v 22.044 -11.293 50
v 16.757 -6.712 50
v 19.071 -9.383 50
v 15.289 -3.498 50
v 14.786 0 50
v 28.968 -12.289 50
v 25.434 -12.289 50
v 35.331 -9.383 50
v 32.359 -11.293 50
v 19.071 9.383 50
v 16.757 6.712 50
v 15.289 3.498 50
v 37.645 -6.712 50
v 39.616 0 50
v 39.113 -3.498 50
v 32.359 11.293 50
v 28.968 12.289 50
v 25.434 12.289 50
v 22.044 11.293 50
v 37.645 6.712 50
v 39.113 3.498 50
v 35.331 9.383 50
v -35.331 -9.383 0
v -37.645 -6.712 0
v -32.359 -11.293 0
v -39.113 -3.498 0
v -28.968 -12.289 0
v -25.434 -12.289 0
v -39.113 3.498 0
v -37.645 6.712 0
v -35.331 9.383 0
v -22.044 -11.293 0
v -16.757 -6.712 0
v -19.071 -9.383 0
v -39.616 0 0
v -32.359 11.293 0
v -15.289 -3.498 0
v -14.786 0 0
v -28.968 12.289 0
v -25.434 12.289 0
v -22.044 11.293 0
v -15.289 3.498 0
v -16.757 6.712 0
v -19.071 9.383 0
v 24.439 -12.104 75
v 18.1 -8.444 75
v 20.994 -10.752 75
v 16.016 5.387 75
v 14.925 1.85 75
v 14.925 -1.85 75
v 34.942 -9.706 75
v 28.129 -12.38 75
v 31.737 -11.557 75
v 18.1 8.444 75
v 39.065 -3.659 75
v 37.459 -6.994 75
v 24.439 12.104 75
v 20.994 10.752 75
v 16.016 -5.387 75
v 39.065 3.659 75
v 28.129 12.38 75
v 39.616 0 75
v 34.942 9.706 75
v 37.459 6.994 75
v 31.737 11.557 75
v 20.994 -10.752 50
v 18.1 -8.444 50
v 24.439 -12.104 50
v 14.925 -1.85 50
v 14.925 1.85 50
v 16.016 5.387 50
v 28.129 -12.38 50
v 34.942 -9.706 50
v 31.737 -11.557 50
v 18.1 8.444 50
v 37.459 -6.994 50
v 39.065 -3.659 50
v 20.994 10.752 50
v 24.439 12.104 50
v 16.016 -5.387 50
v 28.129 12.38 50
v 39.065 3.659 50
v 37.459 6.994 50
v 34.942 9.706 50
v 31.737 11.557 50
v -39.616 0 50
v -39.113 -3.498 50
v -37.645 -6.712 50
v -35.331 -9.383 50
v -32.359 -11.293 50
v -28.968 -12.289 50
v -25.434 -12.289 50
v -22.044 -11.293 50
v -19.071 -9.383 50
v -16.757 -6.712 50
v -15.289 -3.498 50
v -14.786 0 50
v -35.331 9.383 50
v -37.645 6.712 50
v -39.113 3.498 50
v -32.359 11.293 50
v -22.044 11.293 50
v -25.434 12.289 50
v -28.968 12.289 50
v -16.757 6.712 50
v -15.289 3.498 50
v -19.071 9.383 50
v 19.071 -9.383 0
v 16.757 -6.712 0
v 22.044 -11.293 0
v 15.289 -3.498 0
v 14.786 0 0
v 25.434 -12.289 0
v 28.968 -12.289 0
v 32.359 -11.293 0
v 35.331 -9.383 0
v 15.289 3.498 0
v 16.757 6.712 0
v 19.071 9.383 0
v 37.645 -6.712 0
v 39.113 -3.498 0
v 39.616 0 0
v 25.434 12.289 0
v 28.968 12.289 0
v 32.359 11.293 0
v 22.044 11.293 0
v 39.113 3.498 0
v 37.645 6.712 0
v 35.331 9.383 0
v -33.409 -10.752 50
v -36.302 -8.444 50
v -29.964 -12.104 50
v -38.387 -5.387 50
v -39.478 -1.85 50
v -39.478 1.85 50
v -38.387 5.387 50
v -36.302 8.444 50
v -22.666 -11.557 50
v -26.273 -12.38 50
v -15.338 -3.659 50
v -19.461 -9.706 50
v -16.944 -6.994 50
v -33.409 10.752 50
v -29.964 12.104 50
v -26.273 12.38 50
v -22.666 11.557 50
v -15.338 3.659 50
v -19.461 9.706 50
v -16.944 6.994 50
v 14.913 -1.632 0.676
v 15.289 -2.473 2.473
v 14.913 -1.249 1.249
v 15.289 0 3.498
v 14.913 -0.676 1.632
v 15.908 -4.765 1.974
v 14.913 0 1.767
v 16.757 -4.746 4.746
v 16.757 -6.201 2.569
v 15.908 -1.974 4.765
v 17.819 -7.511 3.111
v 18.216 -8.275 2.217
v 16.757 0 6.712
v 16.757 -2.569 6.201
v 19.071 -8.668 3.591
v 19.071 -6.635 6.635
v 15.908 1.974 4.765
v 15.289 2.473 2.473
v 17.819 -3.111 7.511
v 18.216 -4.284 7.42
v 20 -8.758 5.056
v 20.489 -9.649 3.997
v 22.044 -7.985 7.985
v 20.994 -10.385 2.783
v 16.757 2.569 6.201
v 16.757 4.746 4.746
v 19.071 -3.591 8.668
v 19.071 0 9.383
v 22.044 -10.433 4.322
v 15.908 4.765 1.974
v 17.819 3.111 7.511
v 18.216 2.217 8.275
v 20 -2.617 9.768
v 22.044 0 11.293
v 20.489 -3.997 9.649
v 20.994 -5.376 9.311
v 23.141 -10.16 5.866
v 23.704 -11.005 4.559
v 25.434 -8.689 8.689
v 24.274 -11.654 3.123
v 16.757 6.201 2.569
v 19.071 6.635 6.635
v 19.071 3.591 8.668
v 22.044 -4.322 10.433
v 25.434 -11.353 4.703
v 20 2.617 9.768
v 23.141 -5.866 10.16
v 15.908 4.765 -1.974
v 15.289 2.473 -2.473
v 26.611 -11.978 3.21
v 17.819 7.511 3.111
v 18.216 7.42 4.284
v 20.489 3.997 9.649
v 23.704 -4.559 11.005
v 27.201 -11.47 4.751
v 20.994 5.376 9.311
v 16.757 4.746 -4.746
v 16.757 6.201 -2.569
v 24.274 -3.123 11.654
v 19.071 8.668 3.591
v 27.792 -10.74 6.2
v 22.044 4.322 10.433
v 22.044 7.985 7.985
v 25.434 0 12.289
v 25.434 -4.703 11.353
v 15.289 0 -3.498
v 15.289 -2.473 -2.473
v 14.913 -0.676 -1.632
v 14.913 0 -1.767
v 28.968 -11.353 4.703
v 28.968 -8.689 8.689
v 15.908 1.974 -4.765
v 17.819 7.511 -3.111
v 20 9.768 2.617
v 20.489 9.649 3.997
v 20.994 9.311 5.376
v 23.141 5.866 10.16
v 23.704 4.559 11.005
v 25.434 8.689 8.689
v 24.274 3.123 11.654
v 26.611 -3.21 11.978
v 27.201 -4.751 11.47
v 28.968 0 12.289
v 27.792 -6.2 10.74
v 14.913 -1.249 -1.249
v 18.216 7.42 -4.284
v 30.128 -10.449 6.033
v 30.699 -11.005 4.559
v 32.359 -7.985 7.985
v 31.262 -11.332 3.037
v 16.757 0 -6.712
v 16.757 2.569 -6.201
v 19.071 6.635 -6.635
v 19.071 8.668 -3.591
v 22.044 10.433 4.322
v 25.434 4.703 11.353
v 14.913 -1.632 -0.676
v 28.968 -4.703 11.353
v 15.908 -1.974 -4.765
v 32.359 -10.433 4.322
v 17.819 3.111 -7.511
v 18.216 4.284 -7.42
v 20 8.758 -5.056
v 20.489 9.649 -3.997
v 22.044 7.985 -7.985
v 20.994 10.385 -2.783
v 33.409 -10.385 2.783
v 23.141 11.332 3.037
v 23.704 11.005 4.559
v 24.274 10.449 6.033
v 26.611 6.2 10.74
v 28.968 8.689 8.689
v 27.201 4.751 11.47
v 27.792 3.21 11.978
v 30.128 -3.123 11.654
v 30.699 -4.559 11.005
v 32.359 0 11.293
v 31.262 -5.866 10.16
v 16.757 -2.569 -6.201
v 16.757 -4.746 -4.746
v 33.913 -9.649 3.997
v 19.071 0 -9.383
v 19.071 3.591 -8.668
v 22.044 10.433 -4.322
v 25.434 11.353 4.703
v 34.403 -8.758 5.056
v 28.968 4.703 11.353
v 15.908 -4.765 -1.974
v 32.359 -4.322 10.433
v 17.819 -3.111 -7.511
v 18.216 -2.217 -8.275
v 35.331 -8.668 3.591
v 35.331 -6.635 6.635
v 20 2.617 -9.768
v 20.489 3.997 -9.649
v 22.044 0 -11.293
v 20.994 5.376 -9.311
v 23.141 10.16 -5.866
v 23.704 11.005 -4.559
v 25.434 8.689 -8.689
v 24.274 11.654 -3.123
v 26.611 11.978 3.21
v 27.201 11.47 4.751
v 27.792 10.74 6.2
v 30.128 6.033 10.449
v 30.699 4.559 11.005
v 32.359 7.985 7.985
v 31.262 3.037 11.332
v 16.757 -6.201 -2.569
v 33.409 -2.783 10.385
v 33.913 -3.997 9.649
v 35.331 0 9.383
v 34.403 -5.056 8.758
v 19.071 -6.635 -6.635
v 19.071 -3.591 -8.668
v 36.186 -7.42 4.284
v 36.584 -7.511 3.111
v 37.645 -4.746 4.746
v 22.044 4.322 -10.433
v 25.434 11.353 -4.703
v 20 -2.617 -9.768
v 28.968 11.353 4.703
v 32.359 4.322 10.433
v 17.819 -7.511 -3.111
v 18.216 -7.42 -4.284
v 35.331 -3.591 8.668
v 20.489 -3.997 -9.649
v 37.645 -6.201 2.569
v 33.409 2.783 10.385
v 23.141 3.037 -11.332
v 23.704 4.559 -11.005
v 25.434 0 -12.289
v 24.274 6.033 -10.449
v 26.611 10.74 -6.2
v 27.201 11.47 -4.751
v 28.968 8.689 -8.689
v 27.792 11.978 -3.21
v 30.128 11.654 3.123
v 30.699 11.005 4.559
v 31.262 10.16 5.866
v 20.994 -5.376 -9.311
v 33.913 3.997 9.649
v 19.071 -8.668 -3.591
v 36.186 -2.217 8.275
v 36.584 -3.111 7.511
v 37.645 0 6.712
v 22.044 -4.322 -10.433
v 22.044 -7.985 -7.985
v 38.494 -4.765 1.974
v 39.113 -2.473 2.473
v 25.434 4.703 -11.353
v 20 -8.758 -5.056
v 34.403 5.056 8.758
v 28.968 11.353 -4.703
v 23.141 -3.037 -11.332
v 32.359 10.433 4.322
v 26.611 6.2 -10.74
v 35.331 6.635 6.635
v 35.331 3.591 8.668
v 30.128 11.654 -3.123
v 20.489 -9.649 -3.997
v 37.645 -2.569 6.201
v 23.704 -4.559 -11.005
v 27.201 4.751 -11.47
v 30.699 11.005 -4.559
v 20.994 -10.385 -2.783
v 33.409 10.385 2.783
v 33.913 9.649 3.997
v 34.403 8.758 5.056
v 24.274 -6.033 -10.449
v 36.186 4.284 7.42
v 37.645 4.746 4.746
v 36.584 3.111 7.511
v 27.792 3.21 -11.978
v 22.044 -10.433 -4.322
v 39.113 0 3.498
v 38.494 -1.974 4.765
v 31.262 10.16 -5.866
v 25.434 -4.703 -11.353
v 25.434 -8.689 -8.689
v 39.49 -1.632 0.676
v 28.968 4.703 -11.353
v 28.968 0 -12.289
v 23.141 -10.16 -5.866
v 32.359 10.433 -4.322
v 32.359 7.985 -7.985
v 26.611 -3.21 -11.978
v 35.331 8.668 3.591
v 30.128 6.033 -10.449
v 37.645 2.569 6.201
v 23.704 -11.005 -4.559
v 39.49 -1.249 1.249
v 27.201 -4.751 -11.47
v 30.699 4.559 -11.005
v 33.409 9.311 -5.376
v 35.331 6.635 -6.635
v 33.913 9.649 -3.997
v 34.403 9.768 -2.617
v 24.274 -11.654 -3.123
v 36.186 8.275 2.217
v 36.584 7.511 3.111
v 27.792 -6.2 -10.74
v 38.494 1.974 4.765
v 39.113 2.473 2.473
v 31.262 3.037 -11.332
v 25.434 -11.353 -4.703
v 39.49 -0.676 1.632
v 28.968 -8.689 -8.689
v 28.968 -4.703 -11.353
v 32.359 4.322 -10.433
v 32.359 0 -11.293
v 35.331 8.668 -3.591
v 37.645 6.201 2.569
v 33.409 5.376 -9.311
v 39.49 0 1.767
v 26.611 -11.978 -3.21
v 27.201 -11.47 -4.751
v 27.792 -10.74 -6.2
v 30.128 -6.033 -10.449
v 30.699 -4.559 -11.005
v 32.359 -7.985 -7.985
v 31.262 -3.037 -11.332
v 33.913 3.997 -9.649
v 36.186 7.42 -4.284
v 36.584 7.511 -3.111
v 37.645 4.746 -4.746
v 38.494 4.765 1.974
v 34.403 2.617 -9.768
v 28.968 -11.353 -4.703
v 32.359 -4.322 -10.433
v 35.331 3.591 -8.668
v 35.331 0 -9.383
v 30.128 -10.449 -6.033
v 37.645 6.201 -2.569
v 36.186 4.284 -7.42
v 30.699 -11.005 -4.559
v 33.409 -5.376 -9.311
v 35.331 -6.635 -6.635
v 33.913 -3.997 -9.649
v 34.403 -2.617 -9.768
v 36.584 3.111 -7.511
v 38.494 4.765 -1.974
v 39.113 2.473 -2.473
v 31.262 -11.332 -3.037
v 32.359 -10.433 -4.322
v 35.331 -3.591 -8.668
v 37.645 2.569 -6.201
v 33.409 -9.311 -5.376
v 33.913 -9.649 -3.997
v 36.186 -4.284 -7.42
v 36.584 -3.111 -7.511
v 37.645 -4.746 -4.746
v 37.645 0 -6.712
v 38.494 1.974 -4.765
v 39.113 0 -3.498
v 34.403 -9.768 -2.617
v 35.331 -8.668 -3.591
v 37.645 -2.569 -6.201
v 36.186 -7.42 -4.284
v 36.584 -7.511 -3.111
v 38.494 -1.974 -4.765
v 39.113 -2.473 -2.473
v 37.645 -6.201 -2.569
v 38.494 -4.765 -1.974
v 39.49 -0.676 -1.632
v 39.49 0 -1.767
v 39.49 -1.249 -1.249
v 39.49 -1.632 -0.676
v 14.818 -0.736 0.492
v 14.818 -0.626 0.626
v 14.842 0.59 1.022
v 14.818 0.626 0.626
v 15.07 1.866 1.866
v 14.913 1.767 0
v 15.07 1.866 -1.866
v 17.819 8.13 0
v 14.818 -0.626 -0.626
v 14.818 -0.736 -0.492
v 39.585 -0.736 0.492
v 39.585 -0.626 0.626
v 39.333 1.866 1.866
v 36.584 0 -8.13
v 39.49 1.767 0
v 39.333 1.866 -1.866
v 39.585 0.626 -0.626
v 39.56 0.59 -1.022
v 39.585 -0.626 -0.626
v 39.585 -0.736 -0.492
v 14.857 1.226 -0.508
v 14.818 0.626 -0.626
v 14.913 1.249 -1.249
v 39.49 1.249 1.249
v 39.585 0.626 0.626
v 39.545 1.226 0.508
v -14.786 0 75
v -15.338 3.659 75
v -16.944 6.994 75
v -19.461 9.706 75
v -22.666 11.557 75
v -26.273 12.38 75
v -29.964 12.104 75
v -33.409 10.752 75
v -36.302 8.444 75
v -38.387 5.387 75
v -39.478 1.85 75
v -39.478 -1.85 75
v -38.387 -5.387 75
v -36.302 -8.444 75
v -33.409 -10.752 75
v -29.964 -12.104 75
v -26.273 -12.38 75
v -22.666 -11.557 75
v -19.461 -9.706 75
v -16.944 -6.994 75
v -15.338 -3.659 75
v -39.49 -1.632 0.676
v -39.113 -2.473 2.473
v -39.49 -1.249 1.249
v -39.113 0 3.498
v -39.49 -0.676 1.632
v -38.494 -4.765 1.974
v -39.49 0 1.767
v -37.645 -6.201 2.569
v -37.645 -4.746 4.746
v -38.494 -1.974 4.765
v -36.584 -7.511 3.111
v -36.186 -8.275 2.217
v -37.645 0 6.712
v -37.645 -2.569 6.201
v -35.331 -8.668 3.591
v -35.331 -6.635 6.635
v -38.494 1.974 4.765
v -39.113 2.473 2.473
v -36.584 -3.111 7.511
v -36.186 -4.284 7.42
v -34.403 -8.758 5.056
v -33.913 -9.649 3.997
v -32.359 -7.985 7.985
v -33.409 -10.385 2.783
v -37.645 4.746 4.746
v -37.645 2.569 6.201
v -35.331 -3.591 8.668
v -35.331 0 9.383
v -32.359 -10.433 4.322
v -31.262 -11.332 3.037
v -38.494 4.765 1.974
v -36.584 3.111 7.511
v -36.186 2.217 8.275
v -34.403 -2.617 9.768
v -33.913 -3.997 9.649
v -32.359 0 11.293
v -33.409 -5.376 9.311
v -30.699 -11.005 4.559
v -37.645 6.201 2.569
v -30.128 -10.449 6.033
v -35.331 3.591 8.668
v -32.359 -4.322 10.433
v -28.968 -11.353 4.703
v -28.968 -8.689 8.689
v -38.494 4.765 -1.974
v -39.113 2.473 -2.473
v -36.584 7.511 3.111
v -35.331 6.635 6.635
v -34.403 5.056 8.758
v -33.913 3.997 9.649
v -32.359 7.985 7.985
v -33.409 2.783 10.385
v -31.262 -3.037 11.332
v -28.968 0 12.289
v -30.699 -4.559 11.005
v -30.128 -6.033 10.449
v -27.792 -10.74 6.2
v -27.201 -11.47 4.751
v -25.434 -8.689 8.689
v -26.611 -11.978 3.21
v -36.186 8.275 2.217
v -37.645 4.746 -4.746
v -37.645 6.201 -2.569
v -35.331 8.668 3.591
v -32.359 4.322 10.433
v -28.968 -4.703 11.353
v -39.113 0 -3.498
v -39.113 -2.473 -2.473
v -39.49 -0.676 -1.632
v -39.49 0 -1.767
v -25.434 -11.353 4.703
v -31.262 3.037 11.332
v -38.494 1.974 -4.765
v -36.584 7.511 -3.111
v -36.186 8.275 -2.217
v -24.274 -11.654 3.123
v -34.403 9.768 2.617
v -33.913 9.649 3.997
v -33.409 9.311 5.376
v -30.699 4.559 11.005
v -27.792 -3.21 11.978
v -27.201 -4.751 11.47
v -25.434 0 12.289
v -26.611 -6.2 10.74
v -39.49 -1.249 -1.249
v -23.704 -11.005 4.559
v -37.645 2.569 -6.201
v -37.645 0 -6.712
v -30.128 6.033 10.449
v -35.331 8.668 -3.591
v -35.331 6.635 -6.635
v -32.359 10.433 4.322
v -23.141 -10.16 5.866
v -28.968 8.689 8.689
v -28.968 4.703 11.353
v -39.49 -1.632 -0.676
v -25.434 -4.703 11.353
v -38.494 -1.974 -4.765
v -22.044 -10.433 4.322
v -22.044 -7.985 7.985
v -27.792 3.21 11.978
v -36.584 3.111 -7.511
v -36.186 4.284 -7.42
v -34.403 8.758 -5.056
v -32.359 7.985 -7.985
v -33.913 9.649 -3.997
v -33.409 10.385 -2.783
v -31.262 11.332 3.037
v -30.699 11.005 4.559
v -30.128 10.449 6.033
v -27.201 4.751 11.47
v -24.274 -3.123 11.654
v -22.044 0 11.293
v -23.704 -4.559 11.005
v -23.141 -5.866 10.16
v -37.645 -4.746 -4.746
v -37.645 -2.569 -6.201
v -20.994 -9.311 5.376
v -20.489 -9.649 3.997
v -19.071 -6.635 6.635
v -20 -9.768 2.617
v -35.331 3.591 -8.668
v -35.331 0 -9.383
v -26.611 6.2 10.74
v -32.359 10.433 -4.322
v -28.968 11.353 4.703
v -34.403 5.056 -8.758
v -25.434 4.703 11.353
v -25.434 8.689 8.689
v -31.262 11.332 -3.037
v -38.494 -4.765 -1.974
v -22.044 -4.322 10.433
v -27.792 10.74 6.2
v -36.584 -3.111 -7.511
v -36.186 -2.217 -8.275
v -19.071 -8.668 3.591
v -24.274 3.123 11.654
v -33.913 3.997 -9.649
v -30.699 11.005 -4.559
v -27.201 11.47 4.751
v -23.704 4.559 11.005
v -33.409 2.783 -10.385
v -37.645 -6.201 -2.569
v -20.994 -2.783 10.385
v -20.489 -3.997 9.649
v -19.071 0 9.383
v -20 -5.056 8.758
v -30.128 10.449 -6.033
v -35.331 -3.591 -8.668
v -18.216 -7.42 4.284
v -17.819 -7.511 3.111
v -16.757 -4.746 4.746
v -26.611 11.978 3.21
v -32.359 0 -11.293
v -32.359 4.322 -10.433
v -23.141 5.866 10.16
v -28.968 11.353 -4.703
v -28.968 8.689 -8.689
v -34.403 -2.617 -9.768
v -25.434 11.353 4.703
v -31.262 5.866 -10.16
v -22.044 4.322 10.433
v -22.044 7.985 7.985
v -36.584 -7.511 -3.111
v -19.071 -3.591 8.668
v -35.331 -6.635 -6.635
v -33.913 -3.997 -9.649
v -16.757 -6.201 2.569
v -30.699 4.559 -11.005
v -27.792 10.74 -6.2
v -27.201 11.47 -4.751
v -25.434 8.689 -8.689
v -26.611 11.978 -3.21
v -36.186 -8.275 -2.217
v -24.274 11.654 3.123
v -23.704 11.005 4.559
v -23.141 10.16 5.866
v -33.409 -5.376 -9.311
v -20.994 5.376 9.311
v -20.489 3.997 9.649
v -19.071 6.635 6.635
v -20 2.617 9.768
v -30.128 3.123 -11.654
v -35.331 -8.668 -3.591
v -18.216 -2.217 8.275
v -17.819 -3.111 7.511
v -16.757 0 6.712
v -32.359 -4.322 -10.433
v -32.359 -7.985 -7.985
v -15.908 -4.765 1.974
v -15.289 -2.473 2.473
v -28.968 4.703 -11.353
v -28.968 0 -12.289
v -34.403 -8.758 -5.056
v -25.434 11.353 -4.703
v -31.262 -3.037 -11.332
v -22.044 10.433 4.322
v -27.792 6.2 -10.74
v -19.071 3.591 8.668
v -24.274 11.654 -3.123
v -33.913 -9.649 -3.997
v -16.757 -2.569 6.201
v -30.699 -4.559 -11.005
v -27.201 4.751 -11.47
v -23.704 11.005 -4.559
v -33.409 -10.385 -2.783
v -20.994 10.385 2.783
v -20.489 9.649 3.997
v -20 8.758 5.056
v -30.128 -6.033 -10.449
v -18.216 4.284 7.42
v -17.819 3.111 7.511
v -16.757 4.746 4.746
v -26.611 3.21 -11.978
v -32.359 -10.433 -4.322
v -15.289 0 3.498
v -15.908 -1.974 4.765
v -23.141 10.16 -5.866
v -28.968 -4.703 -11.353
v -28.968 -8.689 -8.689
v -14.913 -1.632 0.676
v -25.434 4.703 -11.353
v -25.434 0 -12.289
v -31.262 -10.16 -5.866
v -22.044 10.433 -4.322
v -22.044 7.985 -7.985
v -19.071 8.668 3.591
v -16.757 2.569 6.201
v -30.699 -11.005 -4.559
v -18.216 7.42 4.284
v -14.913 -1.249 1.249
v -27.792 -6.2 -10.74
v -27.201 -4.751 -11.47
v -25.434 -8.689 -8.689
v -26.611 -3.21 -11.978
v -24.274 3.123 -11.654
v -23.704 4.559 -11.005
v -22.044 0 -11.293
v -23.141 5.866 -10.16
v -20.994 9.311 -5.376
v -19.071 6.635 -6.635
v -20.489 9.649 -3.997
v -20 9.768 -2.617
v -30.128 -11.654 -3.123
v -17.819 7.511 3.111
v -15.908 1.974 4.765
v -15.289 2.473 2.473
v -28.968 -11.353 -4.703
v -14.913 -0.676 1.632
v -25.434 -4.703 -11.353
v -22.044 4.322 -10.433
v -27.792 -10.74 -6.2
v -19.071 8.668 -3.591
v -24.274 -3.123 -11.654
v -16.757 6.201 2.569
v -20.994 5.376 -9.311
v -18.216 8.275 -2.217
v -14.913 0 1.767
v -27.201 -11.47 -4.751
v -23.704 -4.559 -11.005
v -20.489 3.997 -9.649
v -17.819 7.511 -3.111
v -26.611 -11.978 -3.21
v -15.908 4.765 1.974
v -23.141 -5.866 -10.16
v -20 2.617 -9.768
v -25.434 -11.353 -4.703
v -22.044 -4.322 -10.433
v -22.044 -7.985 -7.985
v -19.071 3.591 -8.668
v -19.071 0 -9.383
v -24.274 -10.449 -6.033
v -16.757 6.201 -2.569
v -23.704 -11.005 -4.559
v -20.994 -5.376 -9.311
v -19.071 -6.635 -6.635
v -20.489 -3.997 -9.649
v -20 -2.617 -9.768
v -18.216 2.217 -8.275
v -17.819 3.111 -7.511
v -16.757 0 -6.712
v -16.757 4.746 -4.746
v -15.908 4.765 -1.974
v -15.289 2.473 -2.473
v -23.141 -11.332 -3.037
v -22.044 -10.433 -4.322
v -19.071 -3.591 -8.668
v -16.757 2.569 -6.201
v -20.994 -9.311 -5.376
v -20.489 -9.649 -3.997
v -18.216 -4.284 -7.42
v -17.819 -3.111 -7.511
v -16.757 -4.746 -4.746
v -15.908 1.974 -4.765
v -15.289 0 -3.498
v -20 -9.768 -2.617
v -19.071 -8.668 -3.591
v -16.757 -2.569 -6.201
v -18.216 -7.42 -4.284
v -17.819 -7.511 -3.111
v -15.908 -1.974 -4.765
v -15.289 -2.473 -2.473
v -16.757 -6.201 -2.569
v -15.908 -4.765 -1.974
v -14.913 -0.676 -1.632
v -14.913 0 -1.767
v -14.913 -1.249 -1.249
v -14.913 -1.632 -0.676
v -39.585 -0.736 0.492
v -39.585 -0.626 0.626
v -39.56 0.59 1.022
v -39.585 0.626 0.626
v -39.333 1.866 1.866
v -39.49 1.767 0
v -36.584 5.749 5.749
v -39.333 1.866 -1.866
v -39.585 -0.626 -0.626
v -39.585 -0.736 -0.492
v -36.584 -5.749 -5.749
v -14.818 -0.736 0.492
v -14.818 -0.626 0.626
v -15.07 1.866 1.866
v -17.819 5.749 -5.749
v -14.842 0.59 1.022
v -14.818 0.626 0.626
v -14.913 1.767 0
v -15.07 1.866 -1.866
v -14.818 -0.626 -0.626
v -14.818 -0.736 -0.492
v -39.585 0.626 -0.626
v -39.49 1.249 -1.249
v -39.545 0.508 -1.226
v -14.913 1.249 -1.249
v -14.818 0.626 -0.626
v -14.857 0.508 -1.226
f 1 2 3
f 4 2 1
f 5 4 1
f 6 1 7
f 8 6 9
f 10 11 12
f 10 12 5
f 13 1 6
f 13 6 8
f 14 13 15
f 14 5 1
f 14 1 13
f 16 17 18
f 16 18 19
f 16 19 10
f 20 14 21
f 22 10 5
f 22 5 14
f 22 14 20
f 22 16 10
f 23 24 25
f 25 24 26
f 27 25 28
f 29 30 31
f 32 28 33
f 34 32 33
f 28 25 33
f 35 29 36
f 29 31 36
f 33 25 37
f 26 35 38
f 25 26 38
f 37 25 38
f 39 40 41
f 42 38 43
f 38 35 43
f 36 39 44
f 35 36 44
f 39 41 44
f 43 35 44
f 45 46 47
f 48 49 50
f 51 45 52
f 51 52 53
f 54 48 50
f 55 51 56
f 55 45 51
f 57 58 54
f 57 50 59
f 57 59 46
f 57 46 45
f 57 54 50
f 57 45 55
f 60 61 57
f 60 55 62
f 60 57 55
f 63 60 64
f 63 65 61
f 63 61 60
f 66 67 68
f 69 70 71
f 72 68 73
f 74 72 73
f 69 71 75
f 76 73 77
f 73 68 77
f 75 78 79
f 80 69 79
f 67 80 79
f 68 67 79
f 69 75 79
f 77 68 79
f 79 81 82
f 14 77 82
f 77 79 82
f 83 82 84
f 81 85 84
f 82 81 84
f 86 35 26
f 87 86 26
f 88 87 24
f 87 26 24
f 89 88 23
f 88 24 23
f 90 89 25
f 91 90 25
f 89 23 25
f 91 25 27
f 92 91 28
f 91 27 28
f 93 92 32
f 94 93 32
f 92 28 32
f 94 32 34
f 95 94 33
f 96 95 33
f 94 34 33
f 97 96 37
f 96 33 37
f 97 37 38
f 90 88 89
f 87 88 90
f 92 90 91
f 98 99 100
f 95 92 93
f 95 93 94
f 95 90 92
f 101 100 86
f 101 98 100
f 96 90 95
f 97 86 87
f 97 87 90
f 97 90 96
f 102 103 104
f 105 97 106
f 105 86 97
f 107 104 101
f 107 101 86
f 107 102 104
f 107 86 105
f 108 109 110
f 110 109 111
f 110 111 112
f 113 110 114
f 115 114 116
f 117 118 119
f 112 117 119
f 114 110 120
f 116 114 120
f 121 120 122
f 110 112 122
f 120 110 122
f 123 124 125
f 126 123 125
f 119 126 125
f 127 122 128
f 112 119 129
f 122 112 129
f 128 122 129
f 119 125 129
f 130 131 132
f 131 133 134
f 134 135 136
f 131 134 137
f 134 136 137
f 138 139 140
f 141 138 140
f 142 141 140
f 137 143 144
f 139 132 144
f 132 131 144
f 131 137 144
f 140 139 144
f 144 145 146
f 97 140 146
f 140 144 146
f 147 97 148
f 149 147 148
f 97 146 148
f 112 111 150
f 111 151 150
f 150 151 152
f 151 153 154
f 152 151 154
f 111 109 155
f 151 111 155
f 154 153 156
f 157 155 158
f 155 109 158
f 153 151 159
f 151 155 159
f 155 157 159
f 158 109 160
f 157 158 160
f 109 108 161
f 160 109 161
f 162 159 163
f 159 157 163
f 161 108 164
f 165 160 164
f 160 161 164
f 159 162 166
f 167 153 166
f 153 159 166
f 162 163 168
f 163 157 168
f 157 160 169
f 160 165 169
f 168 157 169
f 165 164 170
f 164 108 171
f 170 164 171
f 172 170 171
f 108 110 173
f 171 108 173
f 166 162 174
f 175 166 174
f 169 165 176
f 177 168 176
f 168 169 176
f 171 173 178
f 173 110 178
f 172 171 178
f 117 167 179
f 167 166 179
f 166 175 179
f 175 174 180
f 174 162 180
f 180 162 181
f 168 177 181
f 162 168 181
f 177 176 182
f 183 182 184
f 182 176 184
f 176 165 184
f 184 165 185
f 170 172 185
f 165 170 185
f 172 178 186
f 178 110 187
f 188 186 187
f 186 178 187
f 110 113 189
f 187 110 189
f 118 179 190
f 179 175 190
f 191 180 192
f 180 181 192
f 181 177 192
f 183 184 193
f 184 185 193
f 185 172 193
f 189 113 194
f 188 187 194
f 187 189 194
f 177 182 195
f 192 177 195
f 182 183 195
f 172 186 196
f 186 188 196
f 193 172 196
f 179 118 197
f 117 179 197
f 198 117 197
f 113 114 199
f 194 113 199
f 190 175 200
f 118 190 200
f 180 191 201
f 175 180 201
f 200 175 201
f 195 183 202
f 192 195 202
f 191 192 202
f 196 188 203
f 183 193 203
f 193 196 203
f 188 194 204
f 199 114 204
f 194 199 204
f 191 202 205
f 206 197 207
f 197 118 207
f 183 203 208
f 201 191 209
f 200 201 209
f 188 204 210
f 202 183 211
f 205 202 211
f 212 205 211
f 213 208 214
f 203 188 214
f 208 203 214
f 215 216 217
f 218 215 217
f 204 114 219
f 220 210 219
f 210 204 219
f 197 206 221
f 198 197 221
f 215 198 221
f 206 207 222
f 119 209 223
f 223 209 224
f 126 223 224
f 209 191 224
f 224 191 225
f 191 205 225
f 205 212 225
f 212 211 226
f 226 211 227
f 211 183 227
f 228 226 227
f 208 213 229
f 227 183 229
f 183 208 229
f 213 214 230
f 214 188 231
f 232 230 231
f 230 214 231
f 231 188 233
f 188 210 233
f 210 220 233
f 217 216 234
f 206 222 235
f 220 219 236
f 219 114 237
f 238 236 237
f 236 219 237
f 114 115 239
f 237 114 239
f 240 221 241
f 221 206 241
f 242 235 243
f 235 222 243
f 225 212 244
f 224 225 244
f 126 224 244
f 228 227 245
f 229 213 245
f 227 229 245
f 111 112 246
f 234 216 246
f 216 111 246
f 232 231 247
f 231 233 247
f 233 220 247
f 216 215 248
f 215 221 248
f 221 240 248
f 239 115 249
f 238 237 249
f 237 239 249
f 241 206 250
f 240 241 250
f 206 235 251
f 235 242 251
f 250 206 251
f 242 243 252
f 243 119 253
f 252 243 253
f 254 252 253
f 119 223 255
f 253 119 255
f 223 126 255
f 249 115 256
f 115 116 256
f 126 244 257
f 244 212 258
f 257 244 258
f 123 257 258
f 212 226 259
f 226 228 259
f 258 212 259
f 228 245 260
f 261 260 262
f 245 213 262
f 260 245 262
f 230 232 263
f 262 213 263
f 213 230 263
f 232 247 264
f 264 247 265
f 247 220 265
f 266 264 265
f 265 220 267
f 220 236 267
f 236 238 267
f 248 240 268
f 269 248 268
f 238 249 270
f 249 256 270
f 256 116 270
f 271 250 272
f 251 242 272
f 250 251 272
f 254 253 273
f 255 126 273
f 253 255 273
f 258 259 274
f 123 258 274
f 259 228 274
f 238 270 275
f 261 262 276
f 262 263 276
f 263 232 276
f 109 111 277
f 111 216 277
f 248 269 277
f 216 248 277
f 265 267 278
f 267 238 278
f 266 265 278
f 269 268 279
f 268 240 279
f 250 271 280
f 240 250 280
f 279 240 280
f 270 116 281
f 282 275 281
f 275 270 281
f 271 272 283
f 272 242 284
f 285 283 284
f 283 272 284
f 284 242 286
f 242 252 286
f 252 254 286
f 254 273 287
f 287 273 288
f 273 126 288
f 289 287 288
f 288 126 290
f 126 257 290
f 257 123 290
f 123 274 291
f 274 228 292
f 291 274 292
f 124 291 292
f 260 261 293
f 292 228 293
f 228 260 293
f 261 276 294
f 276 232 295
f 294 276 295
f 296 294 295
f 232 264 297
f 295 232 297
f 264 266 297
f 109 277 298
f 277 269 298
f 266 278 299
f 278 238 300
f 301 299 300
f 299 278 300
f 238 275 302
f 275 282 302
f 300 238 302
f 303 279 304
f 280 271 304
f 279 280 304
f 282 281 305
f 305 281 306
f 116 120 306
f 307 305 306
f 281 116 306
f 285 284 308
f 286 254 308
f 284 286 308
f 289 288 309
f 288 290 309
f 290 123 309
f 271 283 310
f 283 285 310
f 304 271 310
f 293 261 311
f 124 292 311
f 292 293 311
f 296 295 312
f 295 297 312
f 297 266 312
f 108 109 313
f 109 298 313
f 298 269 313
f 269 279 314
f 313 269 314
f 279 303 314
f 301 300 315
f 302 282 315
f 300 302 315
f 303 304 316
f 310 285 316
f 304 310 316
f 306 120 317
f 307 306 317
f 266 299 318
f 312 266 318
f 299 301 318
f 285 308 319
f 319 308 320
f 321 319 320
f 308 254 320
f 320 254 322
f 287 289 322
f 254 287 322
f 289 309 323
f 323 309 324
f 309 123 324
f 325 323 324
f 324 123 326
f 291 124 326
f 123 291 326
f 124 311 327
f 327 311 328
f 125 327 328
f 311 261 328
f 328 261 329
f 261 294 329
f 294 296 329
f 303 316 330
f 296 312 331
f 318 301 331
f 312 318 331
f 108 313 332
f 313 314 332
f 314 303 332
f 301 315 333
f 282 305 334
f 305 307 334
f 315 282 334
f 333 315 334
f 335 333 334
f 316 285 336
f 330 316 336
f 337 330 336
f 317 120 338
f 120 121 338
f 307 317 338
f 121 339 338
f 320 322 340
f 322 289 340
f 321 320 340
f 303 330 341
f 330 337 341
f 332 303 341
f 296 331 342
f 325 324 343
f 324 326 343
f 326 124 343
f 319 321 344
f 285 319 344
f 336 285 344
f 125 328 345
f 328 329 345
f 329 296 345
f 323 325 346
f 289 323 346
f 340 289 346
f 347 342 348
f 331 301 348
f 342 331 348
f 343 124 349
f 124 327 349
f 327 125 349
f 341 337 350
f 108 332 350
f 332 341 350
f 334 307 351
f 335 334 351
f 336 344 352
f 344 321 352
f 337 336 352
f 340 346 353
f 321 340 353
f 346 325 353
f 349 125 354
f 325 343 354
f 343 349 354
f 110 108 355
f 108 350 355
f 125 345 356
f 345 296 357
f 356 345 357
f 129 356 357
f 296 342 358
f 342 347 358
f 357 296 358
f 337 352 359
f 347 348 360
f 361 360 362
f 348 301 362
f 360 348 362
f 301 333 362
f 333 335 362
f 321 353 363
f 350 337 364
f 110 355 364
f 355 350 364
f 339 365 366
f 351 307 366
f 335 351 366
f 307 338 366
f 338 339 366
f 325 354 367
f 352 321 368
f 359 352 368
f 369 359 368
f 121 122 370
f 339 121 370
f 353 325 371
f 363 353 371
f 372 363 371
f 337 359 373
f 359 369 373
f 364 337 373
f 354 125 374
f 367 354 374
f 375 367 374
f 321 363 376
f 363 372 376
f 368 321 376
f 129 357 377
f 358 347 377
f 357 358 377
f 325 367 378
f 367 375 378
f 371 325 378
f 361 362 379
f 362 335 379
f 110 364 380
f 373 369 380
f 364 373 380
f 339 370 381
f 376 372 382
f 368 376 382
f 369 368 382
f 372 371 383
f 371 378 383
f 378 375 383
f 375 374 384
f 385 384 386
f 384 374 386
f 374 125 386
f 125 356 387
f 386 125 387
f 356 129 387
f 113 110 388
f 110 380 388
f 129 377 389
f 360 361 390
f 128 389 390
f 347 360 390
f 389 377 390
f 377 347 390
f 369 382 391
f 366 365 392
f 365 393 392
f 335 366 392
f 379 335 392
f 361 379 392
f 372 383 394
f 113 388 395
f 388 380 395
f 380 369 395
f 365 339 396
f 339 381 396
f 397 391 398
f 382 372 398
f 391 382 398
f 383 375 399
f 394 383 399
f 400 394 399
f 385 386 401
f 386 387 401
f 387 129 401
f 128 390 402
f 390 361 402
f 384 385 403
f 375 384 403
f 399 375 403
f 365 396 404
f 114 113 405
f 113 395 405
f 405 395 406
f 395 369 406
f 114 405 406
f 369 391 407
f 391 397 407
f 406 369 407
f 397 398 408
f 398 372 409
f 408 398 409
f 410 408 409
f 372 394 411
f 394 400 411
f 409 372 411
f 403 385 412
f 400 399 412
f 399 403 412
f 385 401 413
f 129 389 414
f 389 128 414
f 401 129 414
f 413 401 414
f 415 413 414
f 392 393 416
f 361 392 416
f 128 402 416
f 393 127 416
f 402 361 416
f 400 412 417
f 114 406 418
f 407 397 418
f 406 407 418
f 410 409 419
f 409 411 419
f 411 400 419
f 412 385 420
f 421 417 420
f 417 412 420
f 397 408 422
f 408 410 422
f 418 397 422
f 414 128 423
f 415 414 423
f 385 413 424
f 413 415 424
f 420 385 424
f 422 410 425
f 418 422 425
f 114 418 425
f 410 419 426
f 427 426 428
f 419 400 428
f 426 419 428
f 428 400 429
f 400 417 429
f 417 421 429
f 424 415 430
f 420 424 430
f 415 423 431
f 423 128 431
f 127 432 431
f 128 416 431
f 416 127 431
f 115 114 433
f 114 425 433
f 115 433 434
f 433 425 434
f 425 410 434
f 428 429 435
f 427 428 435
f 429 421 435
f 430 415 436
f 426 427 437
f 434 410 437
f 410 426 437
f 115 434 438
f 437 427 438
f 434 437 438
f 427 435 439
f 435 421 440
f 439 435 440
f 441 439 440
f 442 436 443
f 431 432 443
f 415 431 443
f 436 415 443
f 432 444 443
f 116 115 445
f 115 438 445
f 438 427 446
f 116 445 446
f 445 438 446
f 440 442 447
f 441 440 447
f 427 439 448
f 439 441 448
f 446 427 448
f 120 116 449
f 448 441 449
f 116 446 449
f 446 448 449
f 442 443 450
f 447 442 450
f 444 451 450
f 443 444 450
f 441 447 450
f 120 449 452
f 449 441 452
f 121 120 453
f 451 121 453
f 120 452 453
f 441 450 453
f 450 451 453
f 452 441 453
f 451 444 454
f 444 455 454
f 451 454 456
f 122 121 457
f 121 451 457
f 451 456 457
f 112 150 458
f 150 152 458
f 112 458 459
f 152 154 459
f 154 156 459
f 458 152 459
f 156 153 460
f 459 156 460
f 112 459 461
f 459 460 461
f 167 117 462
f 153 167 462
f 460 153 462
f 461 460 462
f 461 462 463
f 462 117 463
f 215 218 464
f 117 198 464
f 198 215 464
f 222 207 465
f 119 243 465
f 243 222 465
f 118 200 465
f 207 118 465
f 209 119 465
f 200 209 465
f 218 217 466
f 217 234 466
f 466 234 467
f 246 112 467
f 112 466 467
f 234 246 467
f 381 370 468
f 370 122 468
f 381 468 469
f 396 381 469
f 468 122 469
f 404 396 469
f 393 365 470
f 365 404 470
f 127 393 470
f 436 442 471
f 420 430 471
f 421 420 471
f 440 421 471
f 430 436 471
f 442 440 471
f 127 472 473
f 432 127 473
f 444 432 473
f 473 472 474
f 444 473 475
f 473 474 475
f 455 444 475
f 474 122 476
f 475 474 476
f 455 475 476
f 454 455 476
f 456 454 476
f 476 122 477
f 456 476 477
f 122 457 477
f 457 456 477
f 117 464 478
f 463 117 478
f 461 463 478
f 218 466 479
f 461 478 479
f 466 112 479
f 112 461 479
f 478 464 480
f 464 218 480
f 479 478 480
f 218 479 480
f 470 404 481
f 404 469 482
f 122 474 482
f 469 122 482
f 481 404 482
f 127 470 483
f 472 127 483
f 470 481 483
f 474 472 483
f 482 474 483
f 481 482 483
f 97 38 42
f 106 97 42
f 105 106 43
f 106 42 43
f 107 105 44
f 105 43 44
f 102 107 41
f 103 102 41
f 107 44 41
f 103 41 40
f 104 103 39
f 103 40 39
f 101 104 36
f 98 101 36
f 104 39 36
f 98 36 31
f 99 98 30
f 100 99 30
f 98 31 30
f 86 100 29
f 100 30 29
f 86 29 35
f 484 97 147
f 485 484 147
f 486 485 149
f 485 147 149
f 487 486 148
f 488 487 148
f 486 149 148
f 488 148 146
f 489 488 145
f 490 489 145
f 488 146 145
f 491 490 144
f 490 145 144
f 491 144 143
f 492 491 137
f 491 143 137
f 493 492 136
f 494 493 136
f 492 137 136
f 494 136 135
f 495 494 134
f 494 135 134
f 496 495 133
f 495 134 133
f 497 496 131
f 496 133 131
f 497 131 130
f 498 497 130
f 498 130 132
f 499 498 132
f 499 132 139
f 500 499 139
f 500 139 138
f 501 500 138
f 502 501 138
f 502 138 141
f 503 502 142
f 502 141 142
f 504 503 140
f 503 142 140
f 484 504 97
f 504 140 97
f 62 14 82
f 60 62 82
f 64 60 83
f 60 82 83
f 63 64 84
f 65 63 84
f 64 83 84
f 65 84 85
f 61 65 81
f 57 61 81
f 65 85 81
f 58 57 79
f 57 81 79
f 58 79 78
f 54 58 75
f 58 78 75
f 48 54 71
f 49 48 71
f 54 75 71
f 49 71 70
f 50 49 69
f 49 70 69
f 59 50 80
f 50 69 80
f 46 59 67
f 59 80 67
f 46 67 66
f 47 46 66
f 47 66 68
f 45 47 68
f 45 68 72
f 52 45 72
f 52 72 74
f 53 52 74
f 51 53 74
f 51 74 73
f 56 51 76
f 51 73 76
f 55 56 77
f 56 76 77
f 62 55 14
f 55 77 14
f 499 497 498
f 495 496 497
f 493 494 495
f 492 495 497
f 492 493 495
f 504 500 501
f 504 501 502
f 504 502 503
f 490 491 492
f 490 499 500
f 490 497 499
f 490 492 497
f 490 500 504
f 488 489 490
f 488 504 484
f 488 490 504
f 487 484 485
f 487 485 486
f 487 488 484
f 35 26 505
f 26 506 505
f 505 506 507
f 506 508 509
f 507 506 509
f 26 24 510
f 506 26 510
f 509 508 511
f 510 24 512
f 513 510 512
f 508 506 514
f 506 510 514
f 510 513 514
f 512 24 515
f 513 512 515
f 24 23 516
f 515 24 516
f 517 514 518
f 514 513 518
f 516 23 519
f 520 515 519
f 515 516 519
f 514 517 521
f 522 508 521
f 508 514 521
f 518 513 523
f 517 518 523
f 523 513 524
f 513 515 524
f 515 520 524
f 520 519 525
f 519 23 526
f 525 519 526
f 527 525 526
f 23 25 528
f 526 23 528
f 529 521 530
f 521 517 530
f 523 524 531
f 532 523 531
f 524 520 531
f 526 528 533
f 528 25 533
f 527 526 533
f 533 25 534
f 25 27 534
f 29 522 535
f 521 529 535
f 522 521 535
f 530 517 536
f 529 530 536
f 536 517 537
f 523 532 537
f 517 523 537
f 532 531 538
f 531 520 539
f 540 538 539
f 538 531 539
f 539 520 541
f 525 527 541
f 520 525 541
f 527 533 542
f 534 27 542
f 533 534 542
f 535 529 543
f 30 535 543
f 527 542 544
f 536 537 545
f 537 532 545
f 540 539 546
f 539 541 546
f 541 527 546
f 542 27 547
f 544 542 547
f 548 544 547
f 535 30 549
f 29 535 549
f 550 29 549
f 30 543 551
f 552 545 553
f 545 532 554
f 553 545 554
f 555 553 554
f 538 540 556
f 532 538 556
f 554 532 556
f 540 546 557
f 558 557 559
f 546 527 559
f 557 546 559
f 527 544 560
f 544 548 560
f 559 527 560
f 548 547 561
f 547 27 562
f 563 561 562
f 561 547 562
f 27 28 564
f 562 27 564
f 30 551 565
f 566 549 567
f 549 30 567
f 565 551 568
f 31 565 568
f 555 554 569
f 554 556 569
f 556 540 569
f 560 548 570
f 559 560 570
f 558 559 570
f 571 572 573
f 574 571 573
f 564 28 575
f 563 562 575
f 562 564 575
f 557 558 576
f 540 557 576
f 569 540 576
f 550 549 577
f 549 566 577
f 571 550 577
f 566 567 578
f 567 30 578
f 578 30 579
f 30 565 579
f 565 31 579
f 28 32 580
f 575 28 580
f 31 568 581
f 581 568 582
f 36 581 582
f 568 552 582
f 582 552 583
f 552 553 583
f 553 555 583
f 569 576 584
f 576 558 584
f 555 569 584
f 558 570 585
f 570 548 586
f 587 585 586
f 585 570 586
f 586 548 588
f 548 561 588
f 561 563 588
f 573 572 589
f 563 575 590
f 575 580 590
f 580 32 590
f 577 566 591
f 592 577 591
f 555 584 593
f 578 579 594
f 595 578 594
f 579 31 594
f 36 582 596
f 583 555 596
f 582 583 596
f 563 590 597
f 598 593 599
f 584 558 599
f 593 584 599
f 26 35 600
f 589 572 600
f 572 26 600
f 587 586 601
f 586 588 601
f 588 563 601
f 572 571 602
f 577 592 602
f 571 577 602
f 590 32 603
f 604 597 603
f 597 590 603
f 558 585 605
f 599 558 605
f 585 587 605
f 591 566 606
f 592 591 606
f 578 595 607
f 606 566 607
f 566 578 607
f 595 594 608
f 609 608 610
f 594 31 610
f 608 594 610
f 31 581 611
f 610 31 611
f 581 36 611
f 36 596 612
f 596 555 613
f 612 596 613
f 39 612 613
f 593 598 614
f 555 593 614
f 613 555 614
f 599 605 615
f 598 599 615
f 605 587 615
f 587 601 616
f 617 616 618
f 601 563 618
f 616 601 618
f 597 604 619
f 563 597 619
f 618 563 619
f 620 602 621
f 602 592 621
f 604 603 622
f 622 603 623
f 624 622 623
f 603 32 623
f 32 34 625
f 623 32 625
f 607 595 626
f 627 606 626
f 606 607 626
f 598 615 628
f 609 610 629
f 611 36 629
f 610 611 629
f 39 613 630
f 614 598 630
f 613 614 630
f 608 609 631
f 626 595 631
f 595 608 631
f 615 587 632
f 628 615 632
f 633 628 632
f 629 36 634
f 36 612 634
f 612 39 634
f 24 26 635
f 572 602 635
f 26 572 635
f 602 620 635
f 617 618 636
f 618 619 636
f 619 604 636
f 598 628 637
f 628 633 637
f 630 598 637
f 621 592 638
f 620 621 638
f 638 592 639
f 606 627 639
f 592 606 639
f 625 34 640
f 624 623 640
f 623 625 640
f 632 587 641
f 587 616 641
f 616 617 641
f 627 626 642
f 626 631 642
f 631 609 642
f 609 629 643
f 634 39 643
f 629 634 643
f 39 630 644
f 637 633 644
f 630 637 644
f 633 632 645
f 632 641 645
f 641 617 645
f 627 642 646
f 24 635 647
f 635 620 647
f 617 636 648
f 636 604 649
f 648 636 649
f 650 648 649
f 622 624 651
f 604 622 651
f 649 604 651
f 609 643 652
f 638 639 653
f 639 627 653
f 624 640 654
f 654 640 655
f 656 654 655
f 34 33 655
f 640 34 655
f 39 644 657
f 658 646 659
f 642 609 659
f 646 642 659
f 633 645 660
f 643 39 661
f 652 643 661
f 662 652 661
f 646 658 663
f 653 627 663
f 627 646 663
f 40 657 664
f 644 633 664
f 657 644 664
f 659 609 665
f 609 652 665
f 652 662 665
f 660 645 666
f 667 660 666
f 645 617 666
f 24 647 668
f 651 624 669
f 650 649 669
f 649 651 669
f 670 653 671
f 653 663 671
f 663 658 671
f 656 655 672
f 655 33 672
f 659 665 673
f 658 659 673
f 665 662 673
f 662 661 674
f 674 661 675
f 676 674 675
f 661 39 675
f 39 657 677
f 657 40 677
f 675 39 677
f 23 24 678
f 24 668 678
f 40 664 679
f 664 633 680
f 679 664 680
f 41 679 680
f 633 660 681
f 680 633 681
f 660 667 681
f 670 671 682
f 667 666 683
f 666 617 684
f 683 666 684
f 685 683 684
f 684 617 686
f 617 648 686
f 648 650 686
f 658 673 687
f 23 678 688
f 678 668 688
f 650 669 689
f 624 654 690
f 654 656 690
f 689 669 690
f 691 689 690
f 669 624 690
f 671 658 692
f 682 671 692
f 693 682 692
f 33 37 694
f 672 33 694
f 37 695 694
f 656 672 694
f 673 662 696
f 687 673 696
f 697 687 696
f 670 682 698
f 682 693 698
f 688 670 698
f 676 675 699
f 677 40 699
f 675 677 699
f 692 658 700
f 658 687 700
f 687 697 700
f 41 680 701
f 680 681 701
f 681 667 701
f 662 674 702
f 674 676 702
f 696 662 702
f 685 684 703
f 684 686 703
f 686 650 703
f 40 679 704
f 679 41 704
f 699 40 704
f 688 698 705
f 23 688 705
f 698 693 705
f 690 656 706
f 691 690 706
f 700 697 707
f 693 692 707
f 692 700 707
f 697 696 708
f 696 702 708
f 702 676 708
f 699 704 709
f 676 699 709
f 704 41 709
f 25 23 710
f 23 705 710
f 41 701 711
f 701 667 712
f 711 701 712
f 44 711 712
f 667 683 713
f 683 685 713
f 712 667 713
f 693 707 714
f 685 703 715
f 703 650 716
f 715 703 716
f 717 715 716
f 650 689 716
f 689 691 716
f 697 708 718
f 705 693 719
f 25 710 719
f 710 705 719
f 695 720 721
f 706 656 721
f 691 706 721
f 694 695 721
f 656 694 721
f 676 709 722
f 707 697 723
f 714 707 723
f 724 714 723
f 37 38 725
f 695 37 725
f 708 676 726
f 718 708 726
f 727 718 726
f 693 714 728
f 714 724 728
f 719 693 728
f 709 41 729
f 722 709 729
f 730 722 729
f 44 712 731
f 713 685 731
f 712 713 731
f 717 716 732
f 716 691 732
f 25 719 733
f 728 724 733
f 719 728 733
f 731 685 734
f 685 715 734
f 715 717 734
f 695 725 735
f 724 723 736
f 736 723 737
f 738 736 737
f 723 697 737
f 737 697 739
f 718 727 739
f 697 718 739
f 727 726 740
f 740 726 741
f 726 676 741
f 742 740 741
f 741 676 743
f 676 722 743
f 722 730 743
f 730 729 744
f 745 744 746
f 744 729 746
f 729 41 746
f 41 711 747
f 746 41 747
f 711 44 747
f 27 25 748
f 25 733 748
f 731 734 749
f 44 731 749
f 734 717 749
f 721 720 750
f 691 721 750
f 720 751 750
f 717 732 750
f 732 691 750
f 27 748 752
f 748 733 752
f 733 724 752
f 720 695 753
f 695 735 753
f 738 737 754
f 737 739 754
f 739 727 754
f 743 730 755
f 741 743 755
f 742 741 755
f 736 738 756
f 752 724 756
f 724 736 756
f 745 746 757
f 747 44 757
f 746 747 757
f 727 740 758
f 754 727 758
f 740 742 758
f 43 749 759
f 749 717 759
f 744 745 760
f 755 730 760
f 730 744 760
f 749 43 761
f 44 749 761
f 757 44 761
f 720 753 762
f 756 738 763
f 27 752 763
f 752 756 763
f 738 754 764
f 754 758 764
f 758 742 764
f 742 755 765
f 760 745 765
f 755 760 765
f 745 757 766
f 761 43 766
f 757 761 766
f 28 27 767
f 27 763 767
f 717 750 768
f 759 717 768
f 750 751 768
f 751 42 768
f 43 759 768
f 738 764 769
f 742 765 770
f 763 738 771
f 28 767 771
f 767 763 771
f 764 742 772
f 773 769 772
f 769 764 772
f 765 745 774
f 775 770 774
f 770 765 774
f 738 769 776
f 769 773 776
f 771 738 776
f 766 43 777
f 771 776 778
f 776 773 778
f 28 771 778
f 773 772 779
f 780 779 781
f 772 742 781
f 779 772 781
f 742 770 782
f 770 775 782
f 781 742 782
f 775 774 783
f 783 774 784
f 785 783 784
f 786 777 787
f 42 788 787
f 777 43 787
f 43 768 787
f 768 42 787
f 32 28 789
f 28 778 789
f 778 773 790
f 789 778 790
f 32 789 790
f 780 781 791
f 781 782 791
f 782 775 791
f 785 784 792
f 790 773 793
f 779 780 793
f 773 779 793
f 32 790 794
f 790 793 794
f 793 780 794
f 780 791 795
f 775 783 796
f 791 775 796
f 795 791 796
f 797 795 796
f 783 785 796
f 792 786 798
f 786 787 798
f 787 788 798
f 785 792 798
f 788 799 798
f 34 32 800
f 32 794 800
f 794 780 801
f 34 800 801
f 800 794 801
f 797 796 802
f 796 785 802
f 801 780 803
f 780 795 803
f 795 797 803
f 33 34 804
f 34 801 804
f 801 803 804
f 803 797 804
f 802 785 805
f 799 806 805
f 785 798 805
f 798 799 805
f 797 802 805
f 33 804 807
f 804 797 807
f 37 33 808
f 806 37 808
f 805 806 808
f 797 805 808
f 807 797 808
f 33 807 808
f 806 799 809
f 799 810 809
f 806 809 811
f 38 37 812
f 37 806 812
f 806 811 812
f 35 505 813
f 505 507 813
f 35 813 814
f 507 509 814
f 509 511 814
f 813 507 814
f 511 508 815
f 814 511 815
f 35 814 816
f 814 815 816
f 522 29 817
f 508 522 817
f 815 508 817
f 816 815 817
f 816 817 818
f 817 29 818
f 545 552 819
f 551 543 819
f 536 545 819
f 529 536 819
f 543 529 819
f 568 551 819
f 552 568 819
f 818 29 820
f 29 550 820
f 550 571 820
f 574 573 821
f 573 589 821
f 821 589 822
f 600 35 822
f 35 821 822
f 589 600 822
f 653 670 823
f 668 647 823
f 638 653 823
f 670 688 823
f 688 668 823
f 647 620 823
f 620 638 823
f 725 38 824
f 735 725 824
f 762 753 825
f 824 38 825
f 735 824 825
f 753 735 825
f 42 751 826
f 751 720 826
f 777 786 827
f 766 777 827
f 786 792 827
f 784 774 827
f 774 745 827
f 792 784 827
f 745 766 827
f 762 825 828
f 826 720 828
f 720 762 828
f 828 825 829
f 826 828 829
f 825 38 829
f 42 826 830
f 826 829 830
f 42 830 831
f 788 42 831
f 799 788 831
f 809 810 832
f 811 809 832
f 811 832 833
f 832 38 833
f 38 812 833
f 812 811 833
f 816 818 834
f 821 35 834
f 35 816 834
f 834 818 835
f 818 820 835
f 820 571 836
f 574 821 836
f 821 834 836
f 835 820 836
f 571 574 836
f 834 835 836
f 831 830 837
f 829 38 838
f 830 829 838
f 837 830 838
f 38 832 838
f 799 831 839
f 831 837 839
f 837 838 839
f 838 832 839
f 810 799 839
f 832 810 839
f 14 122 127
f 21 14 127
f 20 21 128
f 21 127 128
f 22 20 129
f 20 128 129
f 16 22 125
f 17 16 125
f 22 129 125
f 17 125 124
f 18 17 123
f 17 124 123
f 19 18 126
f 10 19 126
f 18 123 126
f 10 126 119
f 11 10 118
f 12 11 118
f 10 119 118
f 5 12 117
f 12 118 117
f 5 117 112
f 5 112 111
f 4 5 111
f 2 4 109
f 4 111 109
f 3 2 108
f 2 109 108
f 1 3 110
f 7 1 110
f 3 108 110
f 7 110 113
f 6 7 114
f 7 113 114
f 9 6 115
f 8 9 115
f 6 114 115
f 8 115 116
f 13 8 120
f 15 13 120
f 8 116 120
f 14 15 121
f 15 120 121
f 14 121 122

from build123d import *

# Parameters (mm, degrees)
F1_DEPTH  = 50
F1_FACE_R = 12.415021
F3_DEPTH  = 25


with BuildPart() as f1:
    # F0 (on Top) → F1 (new body)
    with BuildSketch(Plane.XY):
        with BuildLine():
            ThreePointArc((-39.616295, 0), (-27.201274, -12.415021), (-14.786254, 0))
            Line((-14.786254, 0), (-27.201274, 0))
            Line((-27.201274, 0), (-39.616295, 0))
        make_face()
        with BuildLine():
            Line((-27.201274, 0), (-14.786254, 0))
            ThreePointArc((-14.786254, 0), (-27.201274, 12.415021), (-39.616295, 0))
            Line((-39.616295, 0), (-27.201274, 0))
        make_face()
        with BuildLine():
            ThreePointArc((39.616295, 0), (27.201274, 12.415021), (14.786254, 0))
            Line((14.786254, 0), (27.201274, 0))
            Line((27.201274, 0), (39.616295, 0))
        make_face()
        with BuildLine():
            Line((27.201274, 0), (14.786254, 0))
            ThreePointArc((14.786254, 0), (27.201274, -12.415021), (39.616295, 0))
            Line((39.616295, 0), (27.201274, 0))
        make_face()
    extrude(amount=F1_DEPTH)


with BuildPart() as f2:
    # F0 (on Top) → F2 (revolve)
    with BuildSketch(Plane.XY):
        with BuildLine():
            ThreePointArc((-39.616295, 0), (-27.201274, -12.415021), (-14.786254, 0))
            Line((-14.786254, 0), (-27.201274, 0))
            Line((-27.201274, 0), (-39.616295, 0))
        make_face()
        with BuildLine():
            Line((27.201274, 0), (14.786254, 0))
            ThreePointArc((14.786254, 0), (27.201274, -12.415021), (39.616295, 0))
            Line((39.616295, 0), (27.201274, 0))
        make_face()
    revolve(axis=Axis((-13.600637, 0, 0), (-1, 0, 0)))


with BuildPart() as f3:
    # F1_face (on face) → F3 (new body)
    with BuildSketch(Plane(origin=(27.201274, 0, 50), x_dir=(1, 0, 0), z_dir=(0, 0, 1))):
        Circle(F1_FACE_R)
        with Locations((-54.402549, 0)):
            Circle(F1_FACE_R)
    extrude(amount=F3_DEPTH)


solid = Compound([f1.part, f2.part, f3.part])
